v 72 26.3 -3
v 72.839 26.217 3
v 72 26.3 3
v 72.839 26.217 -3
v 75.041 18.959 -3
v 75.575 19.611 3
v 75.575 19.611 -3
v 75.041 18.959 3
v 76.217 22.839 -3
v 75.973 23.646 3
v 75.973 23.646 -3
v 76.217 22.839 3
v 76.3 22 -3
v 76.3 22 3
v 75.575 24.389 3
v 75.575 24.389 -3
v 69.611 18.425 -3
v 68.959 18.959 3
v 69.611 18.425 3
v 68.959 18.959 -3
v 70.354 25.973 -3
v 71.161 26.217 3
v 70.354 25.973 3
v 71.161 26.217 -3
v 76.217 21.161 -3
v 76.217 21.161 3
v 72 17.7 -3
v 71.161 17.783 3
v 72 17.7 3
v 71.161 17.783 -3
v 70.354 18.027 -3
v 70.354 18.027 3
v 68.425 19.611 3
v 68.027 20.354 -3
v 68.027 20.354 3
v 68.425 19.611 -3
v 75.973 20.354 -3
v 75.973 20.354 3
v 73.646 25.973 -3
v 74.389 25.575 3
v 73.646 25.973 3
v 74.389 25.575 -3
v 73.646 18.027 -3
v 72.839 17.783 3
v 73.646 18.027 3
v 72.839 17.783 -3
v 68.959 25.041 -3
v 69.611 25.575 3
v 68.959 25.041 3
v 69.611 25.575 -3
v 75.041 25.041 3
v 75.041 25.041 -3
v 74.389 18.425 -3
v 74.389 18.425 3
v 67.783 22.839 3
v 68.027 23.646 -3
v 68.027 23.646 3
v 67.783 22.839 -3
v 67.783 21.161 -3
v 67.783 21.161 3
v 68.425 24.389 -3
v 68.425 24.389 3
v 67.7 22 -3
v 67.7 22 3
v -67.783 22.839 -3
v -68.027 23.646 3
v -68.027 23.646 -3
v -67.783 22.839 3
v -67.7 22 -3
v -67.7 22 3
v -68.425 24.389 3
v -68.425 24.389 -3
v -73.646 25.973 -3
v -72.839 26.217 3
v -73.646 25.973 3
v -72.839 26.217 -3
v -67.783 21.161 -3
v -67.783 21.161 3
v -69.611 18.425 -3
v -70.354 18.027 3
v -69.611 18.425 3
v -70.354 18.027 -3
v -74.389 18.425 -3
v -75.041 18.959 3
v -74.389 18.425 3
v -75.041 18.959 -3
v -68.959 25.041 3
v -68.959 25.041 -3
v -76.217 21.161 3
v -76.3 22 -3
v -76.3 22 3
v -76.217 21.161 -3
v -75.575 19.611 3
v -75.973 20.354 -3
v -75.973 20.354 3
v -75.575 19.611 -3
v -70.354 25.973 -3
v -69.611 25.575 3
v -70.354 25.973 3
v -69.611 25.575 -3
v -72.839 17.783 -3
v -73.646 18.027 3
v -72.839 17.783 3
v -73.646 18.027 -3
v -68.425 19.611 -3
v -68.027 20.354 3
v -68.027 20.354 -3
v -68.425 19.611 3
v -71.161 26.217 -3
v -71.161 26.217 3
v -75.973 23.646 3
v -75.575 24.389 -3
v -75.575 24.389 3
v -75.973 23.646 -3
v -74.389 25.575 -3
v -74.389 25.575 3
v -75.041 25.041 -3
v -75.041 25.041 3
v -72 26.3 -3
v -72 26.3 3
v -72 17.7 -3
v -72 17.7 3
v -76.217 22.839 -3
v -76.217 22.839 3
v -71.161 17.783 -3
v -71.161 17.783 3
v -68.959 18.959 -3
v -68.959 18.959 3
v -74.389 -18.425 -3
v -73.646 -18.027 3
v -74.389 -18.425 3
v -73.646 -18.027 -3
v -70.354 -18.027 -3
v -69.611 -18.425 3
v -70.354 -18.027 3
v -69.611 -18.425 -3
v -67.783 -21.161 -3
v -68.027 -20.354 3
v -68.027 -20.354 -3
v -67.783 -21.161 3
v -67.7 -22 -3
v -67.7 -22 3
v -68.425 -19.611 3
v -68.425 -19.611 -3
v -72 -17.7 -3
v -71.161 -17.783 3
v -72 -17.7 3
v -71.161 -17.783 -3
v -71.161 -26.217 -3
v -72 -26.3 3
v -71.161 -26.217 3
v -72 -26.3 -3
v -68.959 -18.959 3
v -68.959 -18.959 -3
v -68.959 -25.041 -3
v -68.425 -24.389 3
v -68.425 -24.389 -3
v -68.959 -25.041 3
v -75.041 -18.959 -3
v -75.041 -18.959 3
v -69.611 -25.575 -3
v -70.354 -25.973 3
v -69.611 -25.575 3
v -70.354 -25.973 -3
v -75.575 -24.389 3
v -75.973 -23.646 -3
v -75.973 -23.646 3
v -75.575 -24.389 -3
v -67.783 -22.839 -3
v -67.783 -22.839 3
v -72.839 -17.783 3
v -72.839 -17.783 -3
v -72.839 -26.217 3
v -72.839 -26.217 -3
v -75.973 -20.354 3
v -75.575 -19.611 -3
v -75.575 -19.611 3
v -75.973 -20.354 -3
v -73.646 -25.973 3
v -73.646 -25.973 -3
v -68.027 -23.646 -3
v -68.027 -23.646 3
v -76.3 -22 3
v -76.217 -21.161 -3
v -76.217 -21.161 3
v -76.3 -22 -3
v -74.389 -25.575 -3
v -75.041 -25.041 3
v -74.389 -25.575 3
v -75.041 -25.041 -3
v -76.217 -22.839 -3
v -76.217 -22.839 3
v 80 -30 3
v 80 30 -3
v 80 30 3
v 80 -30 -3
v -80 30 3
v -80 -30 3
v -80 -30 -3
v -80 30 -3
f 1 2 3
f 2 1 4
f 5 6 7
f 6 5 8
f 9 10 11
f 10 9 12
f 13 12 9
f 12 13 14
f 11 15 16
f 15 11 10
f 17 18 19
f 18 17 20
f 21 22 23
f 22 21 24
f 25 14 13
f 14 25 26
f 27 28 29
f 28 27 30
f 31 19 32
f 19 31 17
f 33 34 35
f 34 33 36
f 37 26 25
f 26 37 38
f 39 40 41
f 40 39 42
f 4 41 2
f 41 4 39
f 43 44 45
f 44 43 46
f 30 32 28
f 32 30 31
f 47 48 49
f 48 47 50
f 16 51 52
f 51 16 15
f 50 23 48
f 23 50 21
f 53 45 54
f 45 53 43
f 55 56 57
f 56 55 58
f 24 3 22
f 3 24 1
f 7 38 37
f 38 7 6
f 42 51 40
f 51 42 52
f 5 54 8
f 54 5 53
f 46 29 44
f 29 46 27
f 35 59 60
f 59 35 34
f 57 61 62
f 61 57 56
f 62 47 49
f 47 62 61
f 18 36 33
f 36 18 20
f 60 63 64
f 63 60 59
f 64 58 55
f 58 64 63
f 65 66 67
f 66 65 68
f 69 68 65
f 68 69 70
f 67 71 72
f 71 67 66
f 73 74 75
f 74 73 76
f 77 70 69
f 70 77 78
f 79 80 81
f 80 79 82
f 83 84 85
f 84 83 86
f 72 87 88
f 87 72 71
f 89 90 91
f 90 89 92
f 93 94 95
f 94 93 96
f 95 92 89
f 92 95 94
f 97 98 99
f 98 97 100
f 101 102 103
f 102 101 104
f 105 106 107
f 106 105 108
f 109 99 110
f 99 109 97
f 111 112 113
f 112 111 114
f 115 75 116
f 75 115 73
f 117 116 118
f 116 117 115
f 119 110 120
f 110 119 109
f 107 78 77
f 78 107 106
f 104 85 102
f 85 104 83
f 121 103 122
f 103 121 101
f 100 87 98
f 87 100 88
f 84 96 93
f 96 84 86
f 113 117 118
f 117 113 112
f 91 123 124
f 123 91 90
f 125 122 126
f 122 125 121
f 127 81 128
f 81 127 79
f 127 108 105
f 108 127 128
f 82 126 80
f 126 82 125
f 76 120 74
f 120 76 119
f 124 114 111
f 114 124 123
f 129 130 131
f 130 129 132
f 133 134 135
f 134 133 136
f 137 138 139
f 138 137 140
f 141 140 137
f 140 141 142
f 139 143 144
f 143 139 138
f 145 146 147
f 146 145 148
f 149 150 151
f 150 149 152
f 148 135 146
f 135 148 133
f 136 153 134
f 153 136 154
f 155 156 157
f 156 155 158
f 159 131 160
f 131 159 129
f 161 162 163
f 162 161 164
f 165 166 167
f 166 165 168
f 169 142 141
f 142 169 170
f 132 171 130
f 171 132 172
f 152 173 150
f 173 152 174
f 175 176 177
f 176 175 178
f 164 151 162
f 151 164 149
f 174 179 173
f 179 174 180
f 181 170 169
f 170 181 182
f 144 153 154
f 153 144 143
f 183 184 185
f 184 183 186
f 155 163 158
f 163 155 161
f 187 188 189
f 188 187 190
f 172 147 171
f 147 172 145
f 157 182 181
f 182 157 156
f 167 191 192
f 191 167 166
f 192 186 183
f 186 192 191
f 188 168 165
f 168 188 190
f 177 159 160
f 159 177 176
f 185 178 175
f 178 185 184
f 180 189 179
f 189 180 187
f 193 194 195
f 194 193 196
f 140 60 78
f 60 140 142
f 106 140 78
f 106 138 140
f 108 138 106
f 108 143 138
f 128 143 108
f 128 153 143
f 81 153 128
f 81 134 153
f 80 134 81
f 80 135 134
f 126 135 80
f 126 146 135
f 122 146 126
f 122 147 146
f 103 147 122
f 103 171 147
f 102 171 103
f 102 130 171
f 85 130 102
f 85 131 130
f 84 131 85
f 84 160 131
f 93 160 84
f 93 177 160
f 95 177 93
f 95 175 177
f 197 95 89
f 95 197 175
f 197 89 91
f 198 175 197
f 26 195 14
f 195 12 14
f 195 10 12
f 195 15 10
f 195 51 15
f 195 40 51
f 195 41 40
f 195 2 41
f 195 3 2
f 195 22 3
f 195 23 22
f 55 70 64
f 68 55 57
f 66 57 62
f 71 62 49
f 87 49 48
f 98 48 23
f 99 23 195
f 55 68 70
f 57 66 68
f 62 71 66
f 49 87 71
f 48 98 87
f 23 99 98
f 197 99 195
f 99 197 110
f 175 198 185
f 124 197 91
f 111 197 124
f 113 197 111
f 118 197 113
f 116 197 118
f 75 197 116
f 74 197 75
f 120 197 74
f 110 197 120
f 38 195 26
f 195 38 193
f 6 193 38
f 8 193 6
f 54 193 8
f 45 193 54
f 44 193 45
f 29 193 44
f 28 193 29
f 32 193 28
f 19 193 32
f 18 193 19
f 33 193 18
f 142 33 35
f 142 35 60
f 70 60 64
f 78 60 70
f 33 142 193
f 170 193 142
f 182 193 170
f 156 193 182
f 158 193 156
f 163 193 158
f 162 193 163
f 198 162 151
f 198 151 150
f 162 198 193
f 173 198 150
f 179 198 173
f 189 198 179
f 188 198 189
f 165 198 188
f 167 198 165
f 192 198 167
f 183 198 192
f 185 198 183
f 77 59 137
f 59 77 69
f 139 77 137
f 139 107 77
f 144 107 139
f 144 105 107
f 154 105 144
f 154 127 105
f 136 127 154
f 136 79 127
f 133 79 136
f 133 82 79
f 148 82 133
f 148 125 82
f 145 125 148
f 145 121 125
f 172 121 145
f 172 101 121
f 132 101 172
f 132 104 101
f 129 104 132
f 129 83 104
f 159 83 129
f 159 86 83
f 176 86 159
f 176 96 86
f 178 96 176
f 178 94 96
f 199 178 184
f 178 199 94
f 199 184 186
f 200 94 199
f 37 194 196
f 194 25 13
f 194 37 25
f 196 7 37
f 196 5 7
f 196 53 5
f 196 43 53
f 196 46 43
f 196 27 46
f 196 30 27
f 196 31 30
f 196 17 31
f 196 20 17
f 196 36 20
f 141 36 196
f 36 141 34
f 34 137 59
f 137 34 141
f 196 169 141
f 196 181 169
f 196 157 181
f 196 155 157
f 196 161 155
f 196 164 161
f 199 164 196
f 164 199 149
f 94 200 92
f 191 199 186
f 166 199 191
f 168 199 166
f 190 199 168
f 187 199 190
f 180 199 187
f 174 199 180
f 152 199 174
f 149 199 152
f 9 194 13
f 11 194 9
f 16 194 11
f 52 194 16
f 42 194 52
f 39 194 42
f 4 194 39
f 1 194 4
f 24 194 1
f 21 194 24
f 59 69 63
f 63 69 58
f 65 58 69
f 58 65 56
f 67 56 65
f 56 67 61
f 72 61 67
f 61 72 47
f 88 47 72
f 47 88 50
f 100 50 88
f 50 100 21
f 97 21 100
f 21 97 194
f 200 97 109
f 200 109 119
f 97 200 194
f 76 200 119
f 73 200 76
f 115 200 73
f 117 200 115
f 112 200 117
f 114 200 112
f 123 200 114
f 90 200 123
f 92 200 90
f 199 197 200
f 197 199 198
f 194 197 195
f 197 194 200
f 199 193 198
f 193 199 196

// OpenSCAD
$fn = 32;

// ----------------------------------------------------------------------
// Corner plate 160 x 60 x 6
// 3 holes, centres taken from the edge offset
// ----------------------------------------------------------------------

// --- parameters (mm) ---
plate = [160, 60, 6];   // overall size (x, y, z)
holes = 3;              // number of holes the drawing asks for
bore_d = 8.4;           // nominal hole diameter from the drawing
print_allowance = 0.2;  // clearance added for printing
edge = 8;               // hole centre offset from the plate edge

// --- derived feature positions (mm) ---
hole_d = bore_d + print_allowance;  // = 8.6   hole diameter as printed
corner_x = plate[0] / 2 - edge;     // = 72   corner hole X
corner_y = plate[1] / 2 - edge;     // = 22   corner hole Y
feature_centers = [
  [corner_x, corner_y],
  [-corner_x, corner_y],
  [-corner_x, -corner_y]
];   // hole centres the loop below drills

// plate outline, every hole drilled through with the same cutters
difference() {
  cube(plate, center = true);
  for (centre = feature_centers)
    translate([centre[0], centre[1], 0])
      cylinder(d = hole_d, h = plate[2] + 2, center = true);
}
